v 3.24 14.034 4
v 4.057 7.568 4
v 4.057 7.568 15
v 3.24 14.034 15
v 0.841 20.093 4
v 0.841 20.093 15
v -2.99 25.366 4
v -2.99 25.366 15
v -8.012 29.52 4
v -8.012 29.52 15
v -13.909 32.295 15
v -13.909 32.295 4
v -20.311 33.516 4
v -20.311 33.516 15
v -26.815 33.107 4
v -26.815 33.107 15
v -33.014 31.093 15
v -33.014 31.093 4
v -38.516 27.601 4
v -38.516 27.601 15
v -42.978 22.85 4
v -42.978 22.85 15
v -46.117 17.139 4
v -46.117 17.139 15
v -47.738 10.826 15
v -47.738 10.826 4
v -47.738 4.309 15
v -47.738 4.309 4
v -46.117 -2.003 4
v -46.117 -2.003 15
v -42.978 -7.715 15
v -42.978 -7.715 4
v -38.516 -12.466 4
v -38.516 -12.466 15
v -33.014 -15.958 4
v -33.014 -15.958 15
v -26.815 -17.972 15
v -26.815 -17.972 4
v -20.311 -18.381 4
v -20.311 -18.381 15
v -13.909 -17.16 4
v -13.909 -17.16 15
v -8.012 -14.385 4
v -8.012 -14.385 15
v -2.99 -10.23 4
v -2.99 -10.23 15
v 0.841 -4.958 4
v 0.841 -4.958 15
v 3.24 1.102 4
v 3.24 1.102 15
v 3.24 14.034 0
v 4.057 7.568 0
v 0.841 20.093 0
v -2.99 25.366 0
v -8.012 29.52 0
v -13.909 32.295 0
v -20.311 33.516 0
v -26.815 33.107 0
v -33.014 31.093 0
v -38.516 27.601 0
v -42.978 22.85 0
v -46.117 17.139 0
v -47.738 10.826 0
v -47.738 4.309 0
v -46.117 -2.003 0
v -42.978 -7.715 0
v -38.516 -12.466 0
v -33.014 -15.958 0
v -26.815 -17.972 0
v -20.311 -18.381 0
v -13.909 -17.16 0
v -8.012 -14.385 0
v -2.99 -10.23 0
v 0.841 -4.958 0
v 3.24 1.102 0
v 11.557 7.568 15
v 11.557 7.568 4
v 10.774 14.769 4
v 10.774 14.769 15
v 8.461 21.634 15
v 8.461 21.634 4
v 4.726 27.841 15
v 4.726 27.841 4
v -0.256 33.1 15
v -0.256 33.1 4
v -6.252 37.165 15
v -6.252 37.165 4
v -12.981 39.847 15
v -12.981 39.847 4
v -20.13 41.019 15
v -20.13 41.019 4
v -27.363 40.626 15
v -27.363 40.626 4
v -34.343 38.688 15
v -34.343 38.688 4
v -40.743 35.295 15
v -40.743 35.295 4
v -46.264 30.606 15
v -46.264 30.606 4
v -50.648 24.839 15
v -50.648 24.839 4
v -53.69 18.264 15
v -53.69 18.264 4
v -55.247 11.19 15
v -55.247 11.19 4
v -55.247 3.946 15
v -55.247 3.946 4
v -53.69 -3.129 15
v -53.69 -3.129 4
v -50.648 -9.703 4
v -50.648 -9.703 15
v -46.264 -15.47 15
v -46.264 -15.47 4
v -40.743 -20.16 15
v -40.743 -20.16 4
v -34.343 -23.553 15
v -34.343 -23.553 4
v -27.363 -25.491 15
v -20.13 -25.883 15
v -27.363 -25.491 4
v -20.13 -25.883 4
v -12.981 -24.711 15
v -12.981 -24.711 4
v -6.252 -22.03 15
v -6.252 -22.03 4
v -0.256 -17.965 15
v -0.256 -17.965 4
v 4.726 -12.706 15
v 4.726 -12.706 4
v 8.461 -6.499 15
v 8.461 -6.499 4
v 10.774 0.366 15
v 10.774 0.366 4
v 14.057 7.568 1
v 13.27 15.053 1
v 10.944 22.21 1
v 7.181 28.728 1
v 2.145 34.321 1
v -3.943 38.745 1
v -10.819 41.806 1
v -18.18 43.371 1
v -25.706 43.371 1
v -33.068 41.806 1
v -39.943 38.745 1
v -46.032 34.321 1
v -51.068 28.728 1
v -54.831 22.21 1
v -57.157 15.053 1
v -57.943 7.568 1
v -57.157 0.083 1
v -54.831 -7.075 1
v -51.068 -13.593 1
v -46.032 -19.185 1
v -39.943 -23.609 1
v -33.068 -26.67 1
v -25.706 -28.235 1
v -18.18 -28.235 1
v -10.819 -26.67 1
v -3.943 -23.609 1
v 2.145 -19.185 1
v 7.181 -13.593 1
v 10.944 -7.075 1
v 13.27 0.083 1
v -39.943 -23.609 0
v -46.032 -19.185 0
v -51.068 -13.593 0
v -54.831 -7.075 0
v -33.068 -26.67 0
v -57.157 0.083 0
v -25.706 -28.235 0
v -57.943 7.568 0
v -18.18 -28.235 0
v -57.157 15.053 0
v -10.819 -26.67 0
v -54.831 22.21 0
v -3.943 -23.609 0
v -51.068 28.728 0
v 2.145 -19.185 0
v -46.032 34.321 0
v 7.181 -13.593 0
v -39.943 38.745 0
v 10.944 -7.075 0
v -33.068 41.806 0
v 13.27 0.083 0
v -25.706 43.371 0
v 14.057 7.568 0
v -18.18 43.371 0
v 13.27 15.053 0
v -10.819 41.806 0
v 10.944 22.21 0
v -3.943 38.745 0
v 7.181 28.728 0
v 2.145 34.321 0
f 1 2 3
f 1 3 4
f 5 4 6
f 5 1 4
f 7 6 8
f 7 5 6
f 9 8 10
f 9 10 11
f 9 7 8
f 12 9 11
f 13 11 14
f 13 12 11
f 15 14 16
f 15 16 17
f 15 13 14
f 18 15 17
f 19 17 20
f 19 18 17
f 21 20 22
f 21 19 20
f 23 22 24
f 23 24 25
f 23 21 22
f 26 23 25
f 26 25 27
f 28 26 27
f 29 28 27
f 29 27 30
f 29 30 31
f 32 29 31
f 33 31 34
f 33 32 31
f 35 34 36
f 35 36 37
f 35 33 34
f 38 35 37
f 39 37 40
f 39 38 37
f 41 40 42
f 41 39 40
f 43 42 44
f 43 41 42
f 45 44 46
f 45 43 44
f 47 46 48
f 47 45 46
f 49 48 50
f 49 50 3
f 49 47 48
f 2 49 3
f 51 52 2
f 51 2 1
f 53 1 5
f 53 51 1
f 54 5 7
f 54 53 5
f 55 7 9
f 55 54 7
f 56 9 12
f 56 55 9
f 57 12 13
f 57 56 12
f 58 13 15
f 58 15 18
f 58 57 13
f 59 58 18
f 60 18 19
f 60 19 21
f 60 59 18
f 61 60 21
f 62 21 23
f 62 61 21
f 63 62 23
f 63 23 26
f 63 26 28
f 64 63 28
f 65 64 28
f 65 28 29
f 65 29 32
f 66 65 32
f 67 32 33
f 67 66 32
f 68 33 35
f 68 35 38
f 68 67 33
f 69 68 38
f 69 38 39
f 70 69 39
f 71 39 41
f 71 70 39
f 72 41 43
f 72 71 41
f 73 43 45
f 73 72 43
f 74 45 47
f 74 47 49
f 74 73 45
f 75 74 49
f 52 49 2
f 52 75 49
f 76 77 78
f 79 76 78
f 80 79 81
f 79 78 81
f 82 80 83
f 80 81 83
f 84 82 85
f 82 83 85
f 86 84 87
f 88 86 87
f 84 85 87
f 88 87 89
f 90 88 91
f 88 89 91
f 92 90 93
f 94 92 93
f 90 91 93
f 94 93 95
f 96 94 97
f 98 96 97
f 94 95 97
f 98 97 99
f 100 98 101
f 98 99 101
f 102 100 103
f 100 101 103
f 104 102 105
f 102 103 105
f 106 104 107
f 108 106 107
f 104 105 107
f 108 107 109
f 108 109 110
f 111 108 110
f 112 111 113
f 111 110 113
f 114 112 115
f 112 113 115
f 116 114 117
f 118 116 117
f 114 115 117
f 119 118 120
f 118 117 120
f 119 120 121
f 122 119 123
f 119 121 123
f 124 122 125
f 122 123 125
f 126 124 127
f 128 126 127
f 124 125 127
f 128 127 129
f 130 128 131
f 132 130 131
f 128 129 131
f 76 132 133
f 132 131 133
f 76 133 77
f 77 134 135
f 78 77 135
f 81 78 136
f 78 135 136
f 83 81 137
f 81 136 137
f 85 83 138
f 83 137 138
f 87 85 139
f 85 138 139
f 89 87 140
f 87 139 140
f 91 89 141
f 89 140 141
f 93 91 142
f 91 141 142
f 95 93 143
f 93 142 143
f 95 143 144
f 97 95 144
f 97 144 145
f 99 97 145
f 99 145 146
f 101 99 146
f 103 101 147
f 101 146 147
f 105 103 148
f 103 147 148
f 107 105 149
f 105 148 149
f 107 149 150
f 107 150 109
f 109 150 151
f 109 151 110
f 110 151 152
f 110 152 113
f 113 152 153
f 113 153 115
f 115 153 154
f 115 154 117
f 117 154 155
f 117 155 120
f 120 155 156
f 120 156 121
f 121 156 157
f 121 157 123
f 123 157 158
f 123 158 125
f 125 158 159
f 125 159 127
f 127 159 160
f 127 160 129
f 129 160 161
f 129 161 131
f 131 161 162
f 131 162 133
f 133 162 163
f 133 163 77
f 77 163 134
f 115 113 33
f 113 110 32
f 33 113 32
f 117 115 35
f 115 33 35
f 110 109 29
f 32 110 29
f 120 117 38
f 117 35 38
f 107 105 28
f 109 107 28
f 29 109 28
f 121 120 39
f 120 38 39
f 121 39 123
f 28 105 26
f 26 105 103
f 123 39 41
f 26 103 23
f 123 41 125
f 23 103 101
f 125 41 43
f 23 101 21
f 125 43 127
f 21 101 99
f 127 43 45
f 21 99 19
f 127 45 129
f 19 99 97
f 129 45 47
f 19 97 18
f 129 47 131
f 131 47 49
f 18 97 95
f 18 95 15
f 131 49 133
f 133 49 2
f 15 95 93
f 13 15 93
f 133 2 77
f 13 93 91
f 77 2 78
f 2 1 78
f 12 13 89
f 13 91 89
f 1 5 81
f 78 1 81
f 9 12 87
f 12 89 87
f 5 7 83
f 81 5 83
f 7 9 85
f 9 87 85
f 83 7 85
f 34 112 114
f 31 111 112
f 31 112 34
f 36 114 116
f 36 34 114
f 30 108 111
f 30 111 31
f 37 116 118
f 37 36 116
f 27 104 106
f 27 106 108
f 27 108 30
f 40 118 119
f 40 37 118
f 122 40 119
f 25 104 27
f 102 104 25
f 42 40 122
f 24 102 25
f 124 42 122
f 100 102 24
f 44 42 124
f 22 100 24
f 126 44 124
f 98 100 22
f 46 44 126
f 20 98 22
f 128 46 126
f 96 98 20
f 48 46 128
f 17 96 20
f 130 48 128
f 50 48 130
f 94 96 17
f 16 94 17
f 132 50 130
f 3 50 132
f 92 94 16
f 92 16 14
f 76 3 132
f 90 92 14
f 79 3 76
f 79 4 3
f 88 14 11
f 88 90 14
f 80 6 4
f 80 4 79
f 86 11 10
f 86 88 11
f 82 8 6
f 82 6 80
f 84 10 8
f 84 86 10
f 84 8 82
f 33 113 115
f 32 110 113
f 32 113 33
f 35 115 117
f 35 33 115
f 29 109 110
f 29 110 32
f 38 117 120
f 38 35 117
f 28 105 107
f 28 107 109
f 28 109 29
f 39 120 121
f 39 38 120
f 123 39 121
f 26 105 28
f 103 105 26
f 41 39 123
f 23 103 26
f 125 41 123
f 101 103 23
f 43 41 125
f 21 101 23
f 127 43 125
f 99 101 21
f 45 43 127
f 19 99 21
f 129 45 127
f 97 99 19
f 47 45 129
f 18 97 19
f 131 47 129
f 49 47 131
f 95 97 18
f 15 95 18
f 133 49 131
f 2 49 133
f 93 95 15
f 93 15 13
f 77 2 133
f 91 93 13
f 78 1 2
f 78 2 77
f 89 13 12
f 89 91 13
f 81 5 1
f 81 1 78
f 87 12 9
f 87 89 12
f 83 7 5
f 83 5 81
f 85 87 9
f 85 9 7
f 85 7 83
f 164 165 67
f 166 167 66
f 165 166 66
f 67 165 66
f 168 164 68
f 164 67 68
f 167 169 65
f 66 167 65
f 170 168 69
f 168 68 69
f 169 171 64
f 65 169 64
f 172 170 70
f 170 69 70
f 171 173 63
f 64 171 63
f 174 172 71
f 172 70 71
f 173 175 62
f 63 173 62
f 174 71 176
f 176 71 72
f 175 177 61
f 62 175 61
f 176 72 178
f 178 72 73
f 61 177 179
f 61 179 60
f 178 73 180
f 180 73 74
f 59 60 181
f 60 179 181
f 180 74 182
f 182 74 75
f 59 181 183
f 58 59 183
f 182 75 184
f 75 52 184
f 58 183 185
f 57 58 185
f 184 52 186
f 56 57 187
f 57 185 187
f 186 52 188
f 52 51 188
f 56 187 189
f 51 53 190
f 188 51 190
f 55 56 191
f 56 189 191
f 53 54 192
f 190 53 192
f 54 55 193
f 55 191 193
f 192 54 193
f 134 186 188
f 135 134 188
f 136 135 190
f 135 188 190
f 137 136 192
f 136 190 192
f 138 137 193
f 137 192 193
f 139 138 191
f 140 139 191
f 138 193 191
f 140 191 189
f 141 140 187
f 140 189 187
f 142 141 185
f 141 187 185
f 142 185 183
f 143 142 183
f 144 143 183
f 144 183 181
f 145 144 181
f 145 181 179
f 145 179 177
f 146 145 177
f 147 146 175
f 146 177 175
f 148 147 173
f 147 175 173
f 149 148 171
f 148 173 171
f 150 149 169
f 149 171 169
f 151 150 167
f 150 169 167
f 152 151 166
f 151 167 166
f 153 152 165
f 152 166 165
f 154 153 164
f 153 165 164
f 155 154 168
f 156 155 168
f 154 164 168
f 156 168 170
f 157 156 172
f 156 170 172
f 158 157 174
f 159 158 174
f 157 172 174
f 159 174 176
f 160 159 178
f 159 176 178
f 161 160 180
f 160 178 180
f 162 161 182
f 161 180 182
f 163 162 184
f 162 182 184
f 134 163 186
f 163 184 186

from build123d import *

# Parameters (mm, degrees)
F0_R     = 36
F0_R_2   = 26
F1_DEPTH = 4
F2_R     = 33.5
F2_R_2   = 26
F3_DEPTH = 11
F4_SIZE2 = 3
F4_SIZE  = 2.5


with BuildPart() as f1:
    # F0 (on Top) → F1 (new body)
    with BuildSketch(Plane.XY):
        with Locations((-21.9432450831, 7.5677670538)):
            Circle(F0_R)
        with Locations((-21.9432450831, 7.5677670538)):
            Circle(F0_R_2, mode=Mode.SUBTRACT)
    extrude(amount=F1_DEPTH)

    # F4
    f4_edges = [f1.edges().sort_by_distance(p)[0] for p in [
        (-57.943245, 7.567767, 4),
    ]]
    f4_side = f1.faces().sort_by_distance((-56.925011, 7.567767, 4))[0]
    chamfer(f4_edges, length=F4_SIZE, length2=F4_SIZE2, reference=f4_side)


with BuildPart() as f3:
    # F2 (on face) → F3 (new body)
    with BuildSketch(Plane.XY.offset(4)):
        with Locations((-21.9432450831, 7.5677670538)):
            Circle(F2_R)
        with Locations((-21.9432450831, 7.5677670538)):
            Circle(F2_R_2, mode=Mode.SUBTRACT)
    extrude(amount=F3_DEPTH)


solid = Compound([f1.part, f3.part])
